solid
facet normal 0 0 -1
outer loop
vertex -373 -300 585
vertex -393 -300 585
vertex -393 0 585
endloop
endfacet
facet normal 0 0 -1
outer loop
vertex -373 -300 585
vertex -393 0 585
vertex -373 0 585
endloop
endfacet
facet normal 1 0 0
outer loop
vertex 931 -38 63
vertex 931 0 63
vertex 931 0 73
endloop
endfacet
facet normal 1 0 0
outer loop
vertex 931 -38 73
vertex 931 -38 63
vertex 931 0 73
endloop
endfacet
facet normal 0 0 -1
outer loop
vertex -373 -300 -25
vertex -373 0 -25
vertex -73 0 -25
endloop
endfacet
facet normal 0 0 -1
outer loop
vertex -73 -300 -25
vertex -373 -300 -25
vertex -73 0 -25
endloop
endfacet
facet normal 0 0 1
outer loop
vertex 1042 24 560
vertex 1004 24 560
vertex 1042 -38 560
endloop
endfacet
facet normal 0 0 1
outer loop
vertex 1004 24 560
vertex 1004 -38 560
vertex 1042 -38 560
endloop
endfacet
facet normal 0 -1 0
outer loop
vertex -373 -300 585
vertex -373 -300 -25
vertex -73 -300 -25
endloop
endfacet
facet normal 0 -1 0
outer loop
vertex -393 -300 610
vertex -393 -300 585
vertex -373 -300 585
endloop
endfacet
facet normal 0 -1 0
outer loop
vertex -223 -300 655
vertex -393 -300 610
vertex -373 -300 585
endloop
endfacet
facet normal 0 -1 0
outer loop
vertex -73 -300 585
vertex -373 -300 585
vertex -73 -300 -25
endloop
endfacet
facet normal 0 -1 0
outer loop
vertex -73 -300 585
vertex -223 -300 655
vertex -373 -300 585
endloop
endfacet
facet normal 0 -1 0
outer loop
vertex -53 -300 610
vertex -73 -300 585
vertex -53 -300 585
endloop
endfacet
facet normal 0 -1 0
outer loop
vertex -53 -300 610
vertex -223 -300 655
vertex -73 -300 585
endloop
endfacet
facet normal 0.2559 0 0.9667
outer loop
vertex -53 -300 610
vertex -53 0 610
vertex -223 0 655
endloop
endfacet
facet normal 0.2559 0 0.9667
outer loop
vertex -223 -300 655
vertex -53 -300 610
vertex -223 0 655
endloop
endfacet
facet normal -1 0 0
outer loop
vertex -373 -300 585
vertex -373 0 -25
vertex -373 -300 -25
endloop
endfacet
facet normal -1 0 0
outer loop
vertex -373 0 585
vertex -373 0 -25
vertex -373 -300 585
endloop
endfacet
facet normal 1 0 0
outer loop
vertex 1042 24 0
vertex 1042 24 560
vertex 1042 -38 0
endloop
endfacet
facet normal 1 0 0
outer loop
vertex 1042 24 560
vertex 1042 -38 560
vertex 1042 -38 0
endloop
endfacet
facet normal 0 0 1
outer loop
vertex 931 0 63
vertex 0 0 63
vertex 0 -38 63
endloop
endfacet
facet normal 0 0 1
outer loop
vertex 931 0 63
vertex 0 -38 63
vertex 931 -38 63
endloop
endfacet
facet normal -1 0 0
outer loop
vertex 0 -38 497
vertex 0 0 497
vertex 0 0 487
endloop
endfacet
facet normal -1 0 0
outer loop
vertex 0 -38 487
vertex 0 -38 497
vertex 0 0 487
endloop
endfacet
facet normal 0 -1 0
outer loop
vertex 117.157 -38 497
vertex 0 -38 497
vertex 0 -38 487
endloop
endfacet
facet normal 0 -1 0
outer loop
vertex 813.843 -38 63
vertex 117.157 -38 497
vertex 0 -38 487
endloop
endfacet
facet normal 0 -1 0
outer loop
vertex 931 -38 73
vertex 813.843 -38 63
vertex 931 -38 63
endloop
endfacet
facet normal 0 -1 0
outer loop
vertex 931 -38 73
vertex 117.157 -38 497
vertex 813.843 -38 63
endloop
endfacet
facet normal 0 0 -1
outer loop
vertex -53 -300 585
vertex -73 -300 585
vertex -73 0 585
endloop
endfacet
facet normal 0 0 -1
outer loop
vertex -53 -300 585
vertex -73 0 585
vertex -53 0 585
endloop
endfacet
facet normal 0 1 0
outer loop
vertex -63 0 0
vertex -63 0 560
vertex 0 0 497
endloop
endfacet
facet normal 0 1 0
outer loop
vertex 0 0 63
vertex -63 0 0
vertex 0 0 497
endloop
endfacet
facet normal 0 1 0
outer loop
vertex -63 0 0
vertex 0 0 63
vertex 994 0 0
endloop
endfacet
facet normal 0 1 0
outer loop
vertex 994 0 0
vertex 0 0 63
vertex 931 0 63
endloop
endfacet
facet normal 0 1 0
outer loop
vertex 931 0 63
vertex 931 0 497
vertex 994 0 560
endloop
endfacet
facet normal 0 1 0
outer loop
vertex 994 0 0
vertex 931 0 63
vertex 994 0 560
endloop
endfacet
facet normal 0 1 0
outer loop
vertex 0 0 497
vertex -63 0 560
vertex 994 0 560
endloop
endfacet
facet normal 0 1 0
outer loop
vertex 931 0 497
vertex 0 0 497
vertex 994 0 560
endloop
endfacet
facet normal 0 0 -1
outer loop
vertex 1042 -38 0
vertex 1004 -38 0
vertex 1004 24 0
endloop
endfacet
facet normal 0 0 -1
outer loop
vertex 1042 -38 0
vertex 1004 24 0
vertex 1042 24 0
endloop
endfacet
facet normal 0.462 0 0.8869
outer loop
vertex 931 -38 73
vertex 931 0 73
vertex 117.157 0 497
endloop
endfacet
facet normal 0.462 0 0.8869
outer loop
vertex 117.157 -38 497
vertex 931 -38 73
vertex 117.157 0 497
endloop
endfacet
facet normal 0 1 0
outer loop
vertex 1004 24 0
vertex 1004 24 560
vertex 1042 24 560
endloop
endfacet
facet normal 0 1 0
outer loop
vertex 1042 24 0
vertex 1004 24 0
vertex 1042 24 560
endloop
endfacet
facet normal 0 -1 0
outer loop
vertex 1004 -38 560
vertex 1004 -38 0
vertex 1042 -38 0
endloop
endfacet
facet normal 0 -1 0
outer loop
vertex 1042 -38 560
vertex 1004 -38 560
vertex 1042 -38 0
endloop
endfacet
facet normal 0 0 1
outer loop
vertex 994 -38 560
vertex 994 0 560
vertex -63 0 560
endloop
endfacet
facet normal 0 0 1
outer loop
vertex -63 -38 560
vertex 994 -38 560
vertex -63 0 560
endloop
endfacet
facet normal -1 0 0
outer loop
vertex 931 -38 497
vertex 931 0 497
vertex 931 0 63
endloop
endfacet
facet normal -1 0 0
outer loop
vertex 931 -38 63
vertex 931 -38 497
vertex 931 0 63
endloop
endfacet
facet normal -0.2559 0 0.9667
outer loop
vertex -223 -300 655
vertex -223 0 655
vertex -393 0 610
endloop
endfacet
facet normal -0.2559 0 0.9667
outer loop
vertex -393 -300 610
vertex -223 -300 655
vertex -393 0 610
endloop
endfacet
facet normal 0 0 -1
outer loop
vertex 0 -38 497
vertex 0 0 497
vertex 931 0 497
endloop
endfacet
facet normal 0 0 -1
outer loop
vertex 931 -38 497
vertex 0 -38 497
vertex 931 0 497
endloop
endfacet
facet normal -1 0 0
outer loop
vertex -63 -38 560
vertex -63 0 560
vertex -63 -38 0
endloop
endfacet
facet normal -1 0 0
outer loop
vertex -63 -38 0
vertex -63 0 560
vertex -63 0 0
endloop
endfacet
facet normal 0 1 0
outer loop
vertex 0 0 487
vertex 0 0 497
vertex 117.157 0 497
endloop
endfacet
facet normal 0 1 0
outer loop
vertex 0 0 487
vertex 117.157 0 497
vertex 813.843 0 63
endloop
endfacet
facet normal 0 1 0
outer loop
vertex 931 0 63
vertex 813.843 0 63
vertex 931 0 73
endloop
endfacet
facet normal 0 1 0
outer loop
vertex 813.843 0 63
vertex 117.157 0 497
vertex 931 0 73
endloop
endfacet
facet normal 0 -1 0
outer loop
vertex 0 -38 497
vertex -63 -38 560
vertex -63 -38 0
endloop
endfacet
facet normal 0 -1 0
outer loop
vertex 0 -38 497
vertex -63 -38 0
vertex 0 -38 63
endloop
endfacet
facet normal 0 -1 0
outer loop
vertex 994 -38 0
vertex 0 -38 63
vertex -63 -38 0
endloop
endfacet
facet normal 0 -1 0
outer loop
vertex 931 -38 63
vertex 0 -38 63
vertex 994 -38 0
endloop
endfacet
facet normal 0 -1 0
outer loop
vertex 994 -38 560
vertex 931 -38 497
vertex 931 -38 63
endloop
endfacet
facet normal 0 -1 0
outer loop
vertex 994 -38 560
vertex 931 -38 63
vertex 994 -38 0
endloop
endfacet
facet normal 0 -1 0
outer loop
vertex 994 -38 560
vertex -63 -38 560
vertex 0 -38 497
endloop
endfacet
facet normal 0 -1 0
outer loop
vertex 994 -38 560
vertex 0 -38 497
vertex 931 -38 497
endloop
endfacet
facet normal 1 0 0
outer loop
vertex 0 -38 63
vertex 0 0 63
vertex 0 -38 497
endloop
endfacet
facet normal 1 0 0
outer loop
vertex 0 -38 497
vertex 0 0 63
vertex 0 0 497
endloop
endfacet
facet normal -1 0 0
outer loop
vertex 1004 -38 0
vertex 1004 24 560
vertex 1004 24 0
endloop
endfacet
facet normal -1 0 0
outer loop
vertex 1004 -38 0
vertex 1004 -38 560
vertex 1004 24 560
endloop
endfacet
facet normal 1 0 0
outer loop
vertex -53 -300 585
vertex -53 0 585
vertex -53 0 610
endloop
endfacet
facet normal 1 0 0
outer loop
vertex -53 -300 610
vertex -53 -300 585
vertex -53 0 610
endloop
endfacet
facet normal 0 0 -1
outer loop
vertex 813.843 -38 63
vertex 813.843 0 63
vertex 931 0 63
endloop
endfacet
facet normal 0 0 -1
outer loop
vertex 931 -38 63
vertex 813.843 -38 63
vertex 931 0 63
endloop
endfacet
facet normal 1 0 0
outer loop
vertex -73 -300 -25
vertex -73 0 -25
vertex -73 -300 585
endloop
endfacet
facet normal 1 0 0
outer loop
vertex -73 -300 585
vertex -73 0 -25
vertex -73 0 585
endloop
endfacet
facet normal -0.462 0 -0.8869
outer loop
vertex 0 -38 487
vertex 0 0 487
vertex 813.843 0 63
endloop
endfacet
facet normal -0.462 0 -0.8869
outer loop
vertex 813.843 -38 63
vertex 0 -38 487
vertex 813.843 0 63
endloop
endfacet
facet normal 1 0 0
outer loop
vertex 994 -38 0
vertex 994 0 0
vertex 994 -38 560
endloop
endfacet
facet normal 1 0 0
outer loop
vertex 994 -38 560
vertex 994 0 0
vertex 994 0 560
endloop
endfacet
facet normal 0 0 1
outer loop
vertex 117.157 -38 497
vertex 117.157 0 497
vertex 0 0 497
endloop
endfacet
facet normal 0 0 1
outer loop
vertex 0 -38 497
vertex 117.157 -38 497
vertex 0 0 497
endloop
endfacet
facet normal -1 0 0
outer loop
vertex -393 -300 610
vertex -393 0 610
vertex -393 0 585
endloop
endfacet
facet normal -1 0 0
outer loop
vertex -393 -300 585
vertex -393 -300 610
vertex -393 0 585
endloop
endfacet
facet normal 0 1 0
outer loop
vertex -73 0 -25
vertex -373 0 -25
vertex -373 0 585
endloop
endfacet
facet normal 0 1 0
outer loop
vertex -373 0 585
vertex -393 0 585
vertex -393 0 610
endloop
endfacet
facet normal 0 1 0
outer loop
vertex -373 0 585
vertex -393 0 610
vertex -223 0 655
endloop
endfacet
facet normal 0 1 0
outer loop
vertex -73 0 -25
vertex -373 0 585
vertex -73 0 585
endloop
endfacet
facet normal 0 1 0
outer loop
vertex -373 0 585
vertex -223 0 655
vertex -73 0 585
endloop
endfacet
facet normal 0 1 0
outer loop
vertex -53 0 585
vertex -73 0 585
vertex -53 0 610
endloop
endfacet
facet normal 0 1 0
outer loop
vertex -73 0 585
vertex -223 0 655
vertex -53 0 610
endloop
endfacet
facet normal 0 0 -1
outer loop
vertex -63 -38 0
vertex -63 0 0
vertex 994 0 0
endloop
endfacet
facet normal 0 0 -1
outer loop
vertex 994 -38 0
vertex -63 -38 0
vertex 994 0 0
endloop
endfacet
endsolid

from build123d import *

# Parameters (mm, degrees)
F0_W      = 931
F0_H      = 63
F0_W_2    = 38
F0_H_2    = 560
F1_DEPTH  = 38
F1_FACE_W = 38
F1_FACE_H = 560
F2_DEPTH  = 24
F4_DEPTH  = 38
F5_W      = 300
F5_H      = 610
F6_DEPTH  = 300


with BuildPart() as f1:
    # F0 (on Front) → F1 (new body)
    with BuildSketch(Plane.XZ):
        with Locations((465.5, 31.5)):
            Rectangle(F0_W, F0_H)
        Polygon((-63, 0), (0, 0), (0, 63), (0, 497), (0, 560), (-63, 560), align=None)
        Polygon((931, 63), (931, 0), (994, 0), (994, 560), (931, 560), (931, 497), align=None)
        with Locations((465.5, 528.5)):
            Rectangle(F0_W, F0_H)
        with Locations((1023, 280)):
            Rectangle(F0_W_2, F0_H_2)
    extrude(amount=F1_DEPTH)

    # F1_face (on face) → F2 (join)
    with BuildSketch(Plane(origin=(1023, 0, 280), x_dir=(1, 0, 0), z_dir=(0, 1, 0))):
        Rectangle(F1_FACE_W, F1_FACE_H)
    extrude(amount=F2_DEPTH)


with BuildPart() as f4:
    # F3 (on Front) → F4 (new body)
    with BuildSketch(Plane.XZ):
        Polygon((931, 73), (117.15732, 497), (0, 497), (0, 487), (813.84268, 63), (931, 63), align=None)
    extrude(amount=F4_DEPTH)


with BuildPart() as f6:
    # F5 (on Front) → F6 (new body)
    with BuildSketch(Plane.XZ):
        with Locations((-223, 280)):
            Rectangle(F5_W, F5_H)
        Polygon((-373, 585), (-73, 585), (-53, 585), (-53, 610), (-223, 655), (-393, 610), (-393, 585), align=None)
    extrude(amount=F6_DEPTH)


solid = Compound([f1.part, f4.part, f6.part])
